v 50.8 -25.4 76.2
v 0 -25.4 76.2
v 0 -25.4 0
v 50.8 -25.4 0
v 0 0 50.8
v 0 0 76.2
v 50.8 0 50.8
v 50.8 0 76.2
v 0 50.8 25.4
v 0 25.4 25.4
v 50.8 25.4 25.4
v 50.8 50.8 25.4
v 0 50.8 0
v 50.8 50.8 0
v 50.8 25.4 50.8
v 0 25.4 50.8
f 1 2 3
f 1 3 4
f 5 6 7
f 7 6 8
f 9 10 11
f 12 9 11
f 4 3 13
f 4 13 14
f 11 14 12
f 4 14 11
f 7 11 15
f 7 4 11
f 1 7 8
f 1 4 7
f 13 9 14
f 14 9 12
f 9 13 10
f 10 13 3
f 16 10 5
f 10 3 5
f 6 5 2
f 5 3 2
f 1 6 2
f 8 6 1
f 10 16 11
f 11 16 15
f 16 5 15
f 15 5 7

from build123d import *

# Parameters (mm, degrees)
F0_W      = 50.8
F0_H      = 76.2
F1_DEPTH  = 25.4
F2_W      = 50.8
F2_H      = 50.8
F1_FACE_W = 50.8
F1_FACE_H = 76.2
F3_DEPTH  = 25.4
F4_W      = 50.8
F4_H      = 25.4
F5_DEPTH  = 50.8


with BuildPart() as f1:
    # F0 (on Front) → F1 (new body)
    with BuildSketch(Plane.XZ):
        with Locations((25.4, 38.1)):
            Rectangle(F0_W, F0_H)
    extrude(amount=F1_DEPTH)

    # F2 (on Front) + F1_face (on face) → F3 (join)
    with BuildSketch(Plane.XZ):
        with Locations((25.4, 25.4)):
            Rectangle(F2_W, F2_H)
    with BuildSketch(Plane(origin=(25.4, -25.4, 38.1), x_dir=(1, 0, 0), z_dir=(0, -1, 0))):
        Rectangle(F1_FACE_W, F1_FACE_H)
    extrude(amount=-F3_DEPTH)

    # F4 (on Front) → F5 (join)
    with BuildSketch(Plane.XZ):
        with Locations((25.4, 12.7)):
            Rectangle(F4_W, F4_H)
    extrude(amount=-F5_DEPTH)


solid = f1.part
